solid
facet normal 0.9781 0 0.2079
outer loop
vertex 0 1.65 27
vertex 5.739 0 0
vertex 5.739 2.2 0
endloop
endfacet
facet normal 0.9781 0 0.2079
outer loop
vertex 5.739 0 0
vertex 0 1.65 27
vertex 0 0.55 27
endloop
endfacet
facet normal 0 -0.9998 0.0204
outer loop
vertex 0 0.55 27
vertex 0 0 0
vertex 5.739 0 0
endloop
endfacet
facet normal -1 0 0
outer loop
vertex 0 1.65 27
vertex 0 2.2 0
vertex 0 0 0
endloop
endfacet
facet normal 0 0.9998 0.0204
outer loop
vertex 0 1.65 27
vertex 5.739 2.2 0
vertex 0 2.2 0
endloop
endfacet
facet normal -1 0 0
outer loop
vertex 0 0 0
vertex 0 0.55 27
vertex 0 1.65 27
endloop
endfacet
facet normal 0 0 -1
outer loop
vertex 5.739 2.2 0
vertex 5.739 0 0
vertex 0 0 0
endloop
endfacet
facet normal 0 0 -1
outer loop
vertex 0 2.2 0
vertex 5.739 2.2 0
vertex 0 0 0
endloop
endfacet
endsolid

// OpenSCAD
//Copyright Austin Floyd 2013
//http://www.thingiverse.com/thing:119050
//license GNU GPL
//austin.floyd at 3DprintGeeks (dot) com

//global variables.. if not set when calling wedge it will use these values. 
//The prefix st_ is to "namespace" the global variables so they're not accidentally overridden elsewhere


//The top angle of the right triangle
st_wedgeAngle=12; // [0.01:89.99]

//The height of the triangle (width auto-generated based on this)
st_wedgeHeight=27; // [0.01:200]

//Depth (thickness) of triangle
st_wedgeWidth=2.2; // [0.01:200]

//Increased or decreased percentage (50% would be 0.5) of top point vs bottom point
st_topFactor=0.5; // [0,0.1,0.2,0.3,0.4,0.5,0.6,0.7,0.8,0.9,1]

//Whether or not to center on x/y/z
st_center=false; // [true, false]

//Flip it upside down
st_invert=false; // [true, false]

//default wedge
wedge();

//demo of several different wedges
//demo();
module demo() {
	translate([0,0,15])
	wedge(angle=75,height=10, wedgeWidth=5);

	wedge(angle=75,height=5,topFactor=.25, center=true, wedgeWidth=10);

	translate([0,0,-15])
	wedge(angle=35,height=13,center=true);

	translate([0,0,-30])
	wedge(angle=35,height=6, center=true, invert=true);
}


module wedge(angle=st_wedgeAngle, height=st_wedgeHeight, wedgeWidth=st_wedgeWidth, topFactor=st_topFactor, center=st_center, invert=st_invert) {
	angle2=180-90-angle;
	hyp=height/sin(angle2);
	width=sqrt(pow(hyp,2)-pow(height,2));
	if (!invert) {
		triangle(height, width, center, topFactor, wedgeWidth);
	}
	if (invert) {
		rotate(180,[1,0,0])
		triangle(height, width, center, topFactor, wedgeWidth);
	}
}
module triangle(height=5, width=5, center=false, topFactor=0.5, wedgeWidth) {
	triangles=[[0,1,4],[5,4,1],		// top
					[1,2,5],[2,3,4],		// sides
					[3,0,4], [4,5,2],	//back
           	[2,1,0], [2,0,3]]; // base
	halfWidth=width/2;
	halfWWidth=wedgeWidth/2;
	topWidth=wedgeWidth*topFactor;
	halfTopWidth=topWidth/2;
	topHalfDiff=(wedgeWidth-topWidth)/2;
	halfHeight=height/2;
	if (center) {
		polyhedron(
  			points=[/*0*/[halfWidth,halfWWidth,-halfHeight],/*1*/[halfWidth,-halfWWidth,-halfHeight],				//front point
					  /*2*/[-halfWidth,-halfWWidth,-halfHeight],       /*3*/[-halfWidth,halfWWidth,-halfHeight], //rear point
           	  /*4*/[-halfWidth,halfTopWidth,height-halfHeight], /*5*/[-halfWidth,-halfTopWidth,height-halfHeight] ], //front/rear top 
  			triangles=triangles
		);
	}
	else {
		polyhedron(
  			points=[/*0*/[width,wedgeWidth,0],         			 /*1*/[width,0,0],				    ////front point
					  /*2*/[0,0,0],       					  			 /*3*/[0,wedgeWidth,0], 		    //rear point
           	  /*4*/[0,wedgeWidth-topHalfDiff,height],/*5*/[0,topHalfDiff,height] ],//front/back top 
  			triangles=triangles
		);
	}
}
